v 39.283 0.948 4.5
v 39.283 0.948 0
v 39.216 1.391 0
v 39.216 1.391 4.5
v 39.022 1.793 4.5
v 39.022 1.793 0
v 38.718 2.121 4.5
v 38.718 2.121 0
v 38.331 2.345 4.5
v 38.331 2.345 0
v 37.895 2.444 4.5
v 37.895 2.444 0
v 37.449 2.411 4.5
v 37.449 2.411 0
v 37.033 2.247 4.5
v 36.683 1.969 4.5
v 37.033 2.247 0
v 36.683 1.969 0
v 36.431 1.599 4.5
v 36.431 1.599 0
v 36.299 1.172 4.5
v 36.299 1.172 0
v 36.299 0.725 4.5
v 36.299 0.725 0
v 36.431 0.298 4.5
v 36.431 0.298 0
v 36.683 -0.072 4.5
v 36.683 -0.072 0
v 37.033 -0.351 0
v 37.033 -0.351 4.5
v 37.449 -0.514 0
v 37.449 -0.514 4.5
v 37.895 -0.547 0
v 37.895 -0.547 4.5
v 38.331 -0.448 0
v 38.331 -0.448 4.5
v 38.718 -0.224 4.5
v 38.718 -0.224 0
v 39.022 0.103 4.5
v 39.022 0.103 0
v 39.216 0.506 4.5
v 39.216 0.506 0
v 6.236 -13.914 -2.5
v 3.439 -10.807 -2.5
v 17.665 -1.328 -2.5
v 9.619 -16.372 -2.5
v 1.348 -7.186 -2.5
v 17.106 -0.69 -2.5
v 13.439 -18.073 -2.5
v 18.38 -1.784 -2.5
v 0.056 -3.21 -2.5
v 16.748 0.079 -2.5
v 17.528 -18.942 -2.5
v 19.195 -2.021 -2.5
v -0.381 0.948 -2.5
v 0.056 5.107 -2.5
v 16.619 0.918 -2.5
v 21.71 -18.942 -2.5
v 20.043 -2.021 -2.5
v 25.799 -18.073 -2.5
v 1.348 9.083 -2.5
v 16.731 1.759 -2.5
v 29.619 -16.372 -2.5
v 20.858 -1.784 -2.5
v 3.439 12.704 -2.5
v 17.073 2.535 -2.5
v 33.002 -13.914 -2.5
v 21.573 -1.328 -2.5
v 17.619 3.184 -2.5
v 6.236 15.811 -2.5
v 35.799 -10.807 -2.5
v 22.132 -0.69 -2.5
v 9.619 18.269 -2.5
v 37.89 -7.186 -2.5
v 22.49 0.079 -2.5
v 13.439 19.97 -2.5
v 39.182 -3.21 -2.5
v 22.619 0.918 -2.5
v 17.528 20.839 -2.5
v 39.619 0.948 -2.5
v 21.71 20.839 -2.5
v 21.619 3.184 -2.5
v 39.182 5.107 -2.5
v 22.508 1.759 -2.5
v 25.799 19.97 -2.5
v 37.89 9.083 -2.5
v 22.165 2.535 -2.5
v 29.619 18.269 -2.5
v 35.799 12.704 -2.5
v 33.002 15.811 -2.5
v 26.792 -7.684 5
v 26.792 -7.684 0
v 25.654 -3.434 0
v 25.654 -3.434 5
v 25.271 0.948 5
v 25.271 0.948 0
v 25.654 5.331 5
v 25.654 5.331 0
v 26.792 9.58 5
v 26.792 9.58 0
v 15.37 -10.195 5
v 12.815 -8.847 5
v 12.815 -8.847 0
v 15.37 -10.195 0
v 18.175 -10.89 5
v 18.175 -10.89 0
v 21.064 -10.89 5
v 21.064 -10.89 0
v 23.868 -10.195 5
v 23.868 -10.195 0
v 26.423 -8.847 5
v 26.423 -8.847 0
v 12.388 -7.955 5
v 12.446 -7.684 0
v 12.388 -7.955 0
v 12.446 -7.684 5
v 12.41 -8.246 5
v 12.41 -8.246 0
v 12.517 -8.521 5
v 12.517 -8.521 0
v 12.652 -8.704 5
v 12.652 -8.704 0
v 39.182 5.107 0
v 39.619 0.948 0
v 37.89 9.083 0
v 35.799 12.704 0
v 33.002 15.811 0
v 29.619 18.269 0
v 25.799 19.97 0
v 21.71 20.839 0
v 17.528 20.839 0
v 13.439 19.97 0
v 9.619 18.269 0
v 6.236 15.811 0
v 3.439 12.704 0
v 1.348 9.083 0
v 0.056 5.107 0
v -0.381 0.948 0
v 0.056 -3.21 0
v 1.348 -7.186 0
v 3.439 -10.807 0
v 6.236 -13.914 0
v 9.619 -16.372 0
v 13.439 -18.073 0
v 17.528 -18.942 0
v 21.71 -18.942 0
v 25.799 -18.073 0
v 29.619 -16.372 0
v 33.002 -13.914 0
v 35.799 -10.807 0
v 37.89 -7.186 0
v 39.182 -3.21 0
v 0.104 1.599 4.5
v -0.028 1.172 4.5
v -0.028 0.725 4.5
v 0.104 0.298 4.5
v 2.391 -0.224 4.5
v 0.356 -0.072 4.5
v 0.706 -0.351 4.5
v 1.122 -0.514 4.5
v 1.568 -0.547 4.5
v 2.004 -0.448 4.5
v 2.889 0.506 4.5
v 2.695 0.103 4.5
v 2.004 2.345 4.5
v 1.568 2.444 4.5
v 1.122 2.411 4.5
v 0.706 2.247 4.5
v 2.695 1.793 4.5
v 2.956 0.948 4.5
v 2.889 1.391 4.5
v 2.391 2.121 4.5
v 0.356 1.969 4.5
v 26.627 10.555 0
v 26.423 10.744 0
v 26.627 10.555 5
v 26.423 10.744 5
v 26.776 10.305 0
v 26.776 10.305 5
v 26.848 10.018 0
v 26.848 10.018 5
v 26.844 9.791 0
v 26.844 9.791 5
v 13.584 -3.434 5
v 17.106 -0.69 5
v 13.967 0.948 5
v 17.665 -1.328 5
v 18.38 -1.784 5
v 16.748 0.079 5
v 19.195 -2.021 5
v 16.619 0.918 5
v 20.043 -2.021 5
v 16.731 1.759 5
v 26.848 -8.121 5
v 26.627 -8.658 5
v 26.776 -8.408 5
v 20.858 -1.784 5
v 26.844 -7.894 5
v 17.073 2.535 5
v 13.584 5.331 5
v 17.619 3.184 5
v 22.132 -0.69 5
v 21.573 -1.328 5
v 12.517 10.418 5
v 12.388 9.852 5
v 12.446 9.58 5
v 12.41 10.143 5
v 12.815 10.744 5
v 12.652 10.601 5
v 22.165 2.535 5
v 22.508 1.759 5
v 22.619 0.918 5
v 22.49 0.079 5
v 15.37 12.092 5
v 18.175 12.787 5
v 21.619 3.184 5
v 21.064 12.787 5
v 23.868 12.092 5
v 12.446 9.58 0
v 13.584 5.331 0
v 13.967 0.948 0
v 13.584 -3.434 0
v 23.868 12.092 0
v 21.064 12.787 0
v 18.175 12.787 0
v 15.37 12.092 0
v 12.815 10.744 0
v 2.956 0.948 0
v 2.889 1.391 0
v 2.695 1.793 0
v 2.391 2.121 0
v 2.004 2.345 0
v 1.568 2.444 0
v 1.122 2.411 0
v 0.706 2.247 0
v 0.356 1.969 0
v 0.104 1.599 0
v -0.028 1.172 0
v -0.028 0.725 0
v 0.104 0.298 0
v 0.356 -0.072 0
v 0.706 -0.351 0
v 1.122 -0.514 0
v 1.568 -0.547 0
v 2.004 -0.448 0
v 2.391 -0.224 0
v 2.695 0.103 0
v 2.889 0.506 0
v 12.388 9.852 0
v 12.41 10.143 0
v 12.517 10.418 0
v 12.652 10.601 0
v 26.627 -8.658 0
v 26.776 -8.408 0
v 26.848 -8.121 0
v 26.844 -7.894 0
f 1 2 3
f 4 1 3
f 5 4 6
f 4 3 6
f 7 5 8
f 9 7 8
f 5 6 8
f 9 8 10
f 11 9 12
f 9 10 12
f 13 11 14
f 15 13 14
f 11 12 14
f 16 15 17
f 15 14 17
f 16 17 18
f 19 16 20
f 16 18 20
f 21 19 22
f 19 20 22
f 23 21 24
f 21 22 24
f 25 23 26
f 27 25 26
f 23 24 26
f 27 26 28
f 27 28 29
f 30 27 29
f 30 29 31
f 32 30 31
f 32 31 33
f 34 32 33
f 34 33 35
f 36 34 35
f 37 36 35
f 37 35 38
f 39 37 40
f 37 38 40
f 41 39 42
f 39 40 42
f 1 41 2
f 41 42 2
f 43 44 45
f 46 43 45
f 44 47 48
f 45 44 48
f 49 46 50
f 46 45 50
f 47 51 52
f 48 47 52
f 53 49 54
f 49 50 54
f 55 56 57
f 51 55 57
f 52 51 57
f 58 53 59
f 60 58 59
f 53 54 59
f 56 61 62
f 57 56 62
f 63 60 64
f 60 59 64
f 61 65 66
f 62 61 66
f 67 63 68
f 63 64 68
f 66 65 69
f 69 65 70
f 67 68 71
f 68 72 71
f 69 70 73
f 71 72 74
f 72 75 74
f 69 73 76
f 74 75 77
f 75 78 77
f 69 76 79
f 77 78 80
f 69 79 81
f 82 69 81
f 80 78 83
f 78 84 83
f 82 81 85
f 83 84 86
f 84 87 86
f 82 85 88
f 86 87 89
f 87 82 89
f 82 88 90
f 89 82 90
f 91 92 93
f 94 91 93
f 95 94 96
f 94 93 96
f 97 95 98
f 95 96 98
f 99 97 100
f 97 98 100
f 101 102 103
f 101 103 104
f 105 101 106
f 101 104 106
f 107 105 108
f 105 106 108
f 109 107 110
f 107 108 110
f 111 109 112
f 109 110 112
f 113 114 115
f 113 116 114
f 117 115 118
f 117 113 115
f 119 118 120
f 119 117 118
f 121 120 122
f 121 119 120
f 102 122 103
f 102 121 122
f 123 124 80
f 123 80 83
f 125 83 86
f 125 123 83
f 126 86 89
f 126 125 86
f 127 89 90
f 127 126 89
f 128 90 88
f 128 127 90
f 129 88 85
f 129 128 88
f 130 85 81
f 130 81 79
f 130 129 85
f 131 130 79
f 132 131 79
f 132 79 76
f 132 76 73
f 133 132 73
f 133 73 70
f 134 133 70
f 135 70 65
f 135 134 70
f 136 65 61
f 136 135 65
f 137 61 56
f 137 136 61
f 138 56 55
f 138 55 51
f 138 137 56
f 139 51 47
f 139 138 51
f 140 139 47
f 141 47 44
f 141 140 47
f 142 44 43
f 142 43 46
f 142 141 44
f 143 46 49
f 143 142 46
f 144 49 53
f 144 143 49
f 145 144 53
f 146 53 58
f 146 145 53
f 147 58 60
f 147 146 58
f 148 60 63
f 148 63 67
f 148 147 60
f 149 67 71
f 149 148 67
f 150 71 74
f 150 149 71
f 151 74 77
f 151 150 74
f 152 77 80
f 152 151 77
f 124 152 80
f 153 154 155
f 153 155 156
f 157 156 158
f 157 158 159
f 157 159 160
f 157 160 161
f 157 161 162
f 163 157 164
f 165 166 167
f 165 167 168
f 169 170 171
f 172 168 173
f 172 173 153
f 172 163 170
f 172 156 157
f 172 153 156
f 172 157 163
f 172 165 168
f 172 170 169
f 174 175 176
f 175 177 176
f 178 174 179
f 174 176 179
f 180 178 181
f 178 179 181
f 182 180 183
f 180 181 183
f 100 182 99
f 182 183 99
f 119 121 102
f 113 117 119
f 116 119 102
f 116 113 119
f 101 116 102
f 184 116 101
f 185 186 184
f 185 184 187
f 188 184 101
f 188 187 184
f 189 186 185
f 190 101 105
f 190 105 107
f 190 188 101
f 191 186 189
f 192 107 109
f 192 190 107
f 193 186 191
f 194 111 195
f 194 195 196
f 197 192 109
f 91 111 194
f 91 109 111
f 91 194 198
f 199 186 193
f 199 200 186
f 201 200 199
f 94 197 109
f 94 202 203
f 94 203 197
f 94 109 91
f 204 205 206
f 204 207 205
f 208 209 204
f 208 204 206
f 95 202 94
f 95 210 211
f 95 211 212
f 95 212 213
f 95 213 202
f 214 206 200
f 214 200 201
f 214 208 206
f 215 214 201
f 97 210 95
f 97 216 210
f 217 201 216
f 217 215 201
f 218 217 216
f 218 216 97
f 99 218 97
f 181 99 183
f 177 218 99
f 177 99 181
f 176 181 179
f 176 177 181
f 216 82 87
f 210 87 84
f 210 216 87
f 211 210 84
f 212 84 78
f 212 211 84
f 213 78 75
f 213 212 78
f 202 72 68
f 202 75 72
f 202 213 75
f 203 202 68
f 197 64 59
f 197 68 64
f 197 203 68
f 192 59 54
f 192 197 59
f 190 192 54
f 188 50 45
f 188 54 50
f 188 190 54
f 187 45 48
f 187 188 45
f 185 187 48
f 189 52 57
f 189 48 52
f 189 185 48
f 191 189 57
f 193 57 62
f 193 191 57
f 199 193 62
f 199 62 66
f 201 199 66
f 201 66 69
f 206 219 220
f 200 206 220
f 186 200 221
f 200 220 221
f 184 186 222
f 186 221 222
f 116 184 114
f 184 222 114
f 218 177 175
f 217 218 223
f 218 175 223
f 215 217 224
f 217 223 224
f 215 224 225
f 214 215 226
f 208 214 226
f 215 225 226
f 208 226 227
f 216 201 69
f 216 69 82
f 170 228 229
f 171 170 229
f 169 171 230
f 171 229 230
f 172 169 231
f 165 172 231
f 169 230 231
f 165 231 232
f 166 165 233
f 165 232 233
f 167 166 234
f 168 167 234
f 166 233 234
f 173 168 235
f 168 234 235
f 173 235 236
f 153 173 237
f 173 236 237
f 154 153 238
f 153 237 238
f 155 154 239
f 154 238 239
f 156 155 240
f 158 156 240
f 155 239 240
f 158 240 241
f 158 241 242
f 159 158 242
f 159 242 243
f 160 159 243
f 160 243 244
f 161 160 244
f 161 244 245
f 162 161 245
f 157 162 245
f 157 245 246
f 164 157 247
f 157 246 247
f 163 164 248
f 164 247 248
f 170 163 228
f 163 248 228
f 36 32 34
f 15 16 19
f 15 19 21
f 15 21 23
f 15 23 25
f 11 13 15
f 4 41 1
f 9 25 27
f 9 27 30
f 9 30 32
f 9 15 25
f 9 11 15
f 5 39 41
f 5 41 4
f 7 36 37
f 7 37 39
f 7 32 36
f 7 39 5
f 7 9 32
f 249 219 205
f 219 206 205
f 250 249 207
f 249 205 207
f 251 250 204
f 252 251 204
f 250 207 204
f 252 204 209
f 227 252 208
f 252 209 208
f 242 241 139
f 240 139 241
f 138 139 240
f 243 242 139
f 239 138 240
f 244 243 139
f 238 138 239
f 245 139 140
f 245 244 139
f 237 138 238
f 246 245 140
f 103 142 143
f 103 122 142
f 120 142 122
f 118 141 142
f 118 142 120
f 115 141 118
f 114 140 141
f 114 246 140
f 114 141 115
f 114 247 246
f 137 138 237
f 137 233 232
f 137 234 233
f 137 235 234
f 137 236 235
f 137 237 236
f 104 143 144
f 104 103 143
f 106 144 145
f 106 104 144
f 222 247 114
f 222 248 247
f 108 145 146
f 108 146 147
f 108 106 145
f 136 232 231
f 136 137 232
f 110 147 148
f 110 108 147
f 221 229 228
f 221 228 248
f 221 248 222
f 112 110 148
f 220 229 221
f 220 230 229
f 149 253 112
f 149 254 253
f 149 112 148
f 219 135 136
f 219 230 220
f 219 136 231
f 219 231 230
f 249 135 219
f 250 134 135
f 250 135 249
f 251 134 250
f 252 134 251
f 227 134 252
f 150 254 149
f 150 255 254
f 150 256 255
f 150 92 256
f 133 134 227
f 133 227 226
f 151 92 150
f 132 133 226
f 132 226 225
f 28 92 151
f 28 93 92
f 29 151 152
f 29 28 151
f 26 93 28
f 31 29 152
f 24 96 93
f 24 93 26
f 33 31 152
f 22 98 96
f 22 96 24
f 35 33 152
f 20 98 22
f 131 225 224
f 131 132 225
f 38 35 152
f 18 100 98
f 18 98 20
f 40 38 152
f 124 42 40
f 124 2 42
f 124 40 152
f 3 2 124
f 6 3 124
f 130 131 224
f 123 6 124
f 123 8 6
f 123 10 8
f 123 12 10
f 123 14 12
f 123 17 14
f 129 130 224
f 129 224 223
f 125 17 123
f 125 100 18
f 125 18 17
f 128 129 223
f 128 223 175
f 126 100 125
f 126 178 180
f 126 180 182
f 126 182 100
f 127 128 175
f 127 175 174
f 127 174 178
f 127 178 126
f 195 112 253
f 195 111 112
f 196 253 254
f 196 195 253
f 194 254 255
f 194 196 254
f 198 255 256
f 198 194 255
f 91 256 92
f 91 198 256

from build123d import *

# Parameters (mm, degrees)
BOSS_EXTRUDE1_DEPTH     = 5
SKETCH2_R               = 20
BOSS_EXTRUDE2_DEPTH     = 2.5
SKETCH3_R               = 1.5
BOSS_EXTRUDE3_DEPTH     = 4.5
CUT_EXTRUDE1_DEPTH      = 6
CUT_EXTRUDE1_DEPTH_BACK = 3.5
FILLET1_R               = 1


with BuildPart() as part:
    # Sketch1 → Boss-Extrude1 (new body)
    with BuildSketch(Plane.XY):
        with BuildLine():
            ThreePointArc((27.055367122, -8.375602421), (25.270767556, 0.948424737), (27.055367122, 10.272451896))
            ThreePointArc((27.055367122, 10.272451896), (19.619068119, 12.874699316), (12.182769116, 10.272451896))
            ThreePointArc((12.182769116, 10.272451896), (13.967368681, 0.948424737), (12.182769116, -8.375602421))
            ThreePointArc((12.182769116, -8.375602421), (19.619068119, -10.977849841), (27.055367122, -8.375602421))
        make_face()
    extrude(amount=BOSS_EXTRUDE1_DEPTH)

    # Sketch2 → Boss-Extrude2 (add)
    with BuildSketch(Plane.XY):
        with Locations((19.619068119, 0.948424737)):
            Circle(SKETCH2_R)
    extrude(amount=-BOSS_EXTRUDE2_DEPTH)

    # Sketch3 → Boss-Extrude3 (add)
    with BuildSketch(Plane.XY):
        with Locations((1.455504919, 0.948424737)):
            Circle(SKETCH3_R)
        with Locations((37.782631319, 0.948424737)):
            Circle(SKETCH3_R)
    extrude(amount=BOSS_EXTRUDE3_DEPTH)

    # Sketch4 → Cut-Extrude1 (cut, two sides)
    with BuildSketch(Plane.XY) as cut_extrude1_sk:
        with BuildLine():
            Line((17.619068119, 3.184492715), (21.619068119, 3.184492715))
            ThreePointArc((21.619068119, 3.184492715), (19.619068119, -2.051575263), (17.619068119, 3.184492715))
        make_face()
    extrude(amount=CUT_EXTRUDE1_DEPTH, mode=Mode.SUBTRACT)
    extrude(cut_extrude1_sk.sketch, amount=-CUT_EXTRUDE1_DEPTH_BACK, mode=Mode.SUBTRACT)

    # Fillet1
    fillet1_edges = [part.edges().sort_by_distance(p)[0] for p in [
        (12.182769116, -8.375602421, 2.5),
        (12.182769116, 10.272451896, 2.5),
        (27.055367122, 10.272451896, 2.5),
        (27.055367122, -8.375602421, 2.5),
    ]]
    fillet(fillet1_edges, radius=FILLET1_R)


solid = part.part
